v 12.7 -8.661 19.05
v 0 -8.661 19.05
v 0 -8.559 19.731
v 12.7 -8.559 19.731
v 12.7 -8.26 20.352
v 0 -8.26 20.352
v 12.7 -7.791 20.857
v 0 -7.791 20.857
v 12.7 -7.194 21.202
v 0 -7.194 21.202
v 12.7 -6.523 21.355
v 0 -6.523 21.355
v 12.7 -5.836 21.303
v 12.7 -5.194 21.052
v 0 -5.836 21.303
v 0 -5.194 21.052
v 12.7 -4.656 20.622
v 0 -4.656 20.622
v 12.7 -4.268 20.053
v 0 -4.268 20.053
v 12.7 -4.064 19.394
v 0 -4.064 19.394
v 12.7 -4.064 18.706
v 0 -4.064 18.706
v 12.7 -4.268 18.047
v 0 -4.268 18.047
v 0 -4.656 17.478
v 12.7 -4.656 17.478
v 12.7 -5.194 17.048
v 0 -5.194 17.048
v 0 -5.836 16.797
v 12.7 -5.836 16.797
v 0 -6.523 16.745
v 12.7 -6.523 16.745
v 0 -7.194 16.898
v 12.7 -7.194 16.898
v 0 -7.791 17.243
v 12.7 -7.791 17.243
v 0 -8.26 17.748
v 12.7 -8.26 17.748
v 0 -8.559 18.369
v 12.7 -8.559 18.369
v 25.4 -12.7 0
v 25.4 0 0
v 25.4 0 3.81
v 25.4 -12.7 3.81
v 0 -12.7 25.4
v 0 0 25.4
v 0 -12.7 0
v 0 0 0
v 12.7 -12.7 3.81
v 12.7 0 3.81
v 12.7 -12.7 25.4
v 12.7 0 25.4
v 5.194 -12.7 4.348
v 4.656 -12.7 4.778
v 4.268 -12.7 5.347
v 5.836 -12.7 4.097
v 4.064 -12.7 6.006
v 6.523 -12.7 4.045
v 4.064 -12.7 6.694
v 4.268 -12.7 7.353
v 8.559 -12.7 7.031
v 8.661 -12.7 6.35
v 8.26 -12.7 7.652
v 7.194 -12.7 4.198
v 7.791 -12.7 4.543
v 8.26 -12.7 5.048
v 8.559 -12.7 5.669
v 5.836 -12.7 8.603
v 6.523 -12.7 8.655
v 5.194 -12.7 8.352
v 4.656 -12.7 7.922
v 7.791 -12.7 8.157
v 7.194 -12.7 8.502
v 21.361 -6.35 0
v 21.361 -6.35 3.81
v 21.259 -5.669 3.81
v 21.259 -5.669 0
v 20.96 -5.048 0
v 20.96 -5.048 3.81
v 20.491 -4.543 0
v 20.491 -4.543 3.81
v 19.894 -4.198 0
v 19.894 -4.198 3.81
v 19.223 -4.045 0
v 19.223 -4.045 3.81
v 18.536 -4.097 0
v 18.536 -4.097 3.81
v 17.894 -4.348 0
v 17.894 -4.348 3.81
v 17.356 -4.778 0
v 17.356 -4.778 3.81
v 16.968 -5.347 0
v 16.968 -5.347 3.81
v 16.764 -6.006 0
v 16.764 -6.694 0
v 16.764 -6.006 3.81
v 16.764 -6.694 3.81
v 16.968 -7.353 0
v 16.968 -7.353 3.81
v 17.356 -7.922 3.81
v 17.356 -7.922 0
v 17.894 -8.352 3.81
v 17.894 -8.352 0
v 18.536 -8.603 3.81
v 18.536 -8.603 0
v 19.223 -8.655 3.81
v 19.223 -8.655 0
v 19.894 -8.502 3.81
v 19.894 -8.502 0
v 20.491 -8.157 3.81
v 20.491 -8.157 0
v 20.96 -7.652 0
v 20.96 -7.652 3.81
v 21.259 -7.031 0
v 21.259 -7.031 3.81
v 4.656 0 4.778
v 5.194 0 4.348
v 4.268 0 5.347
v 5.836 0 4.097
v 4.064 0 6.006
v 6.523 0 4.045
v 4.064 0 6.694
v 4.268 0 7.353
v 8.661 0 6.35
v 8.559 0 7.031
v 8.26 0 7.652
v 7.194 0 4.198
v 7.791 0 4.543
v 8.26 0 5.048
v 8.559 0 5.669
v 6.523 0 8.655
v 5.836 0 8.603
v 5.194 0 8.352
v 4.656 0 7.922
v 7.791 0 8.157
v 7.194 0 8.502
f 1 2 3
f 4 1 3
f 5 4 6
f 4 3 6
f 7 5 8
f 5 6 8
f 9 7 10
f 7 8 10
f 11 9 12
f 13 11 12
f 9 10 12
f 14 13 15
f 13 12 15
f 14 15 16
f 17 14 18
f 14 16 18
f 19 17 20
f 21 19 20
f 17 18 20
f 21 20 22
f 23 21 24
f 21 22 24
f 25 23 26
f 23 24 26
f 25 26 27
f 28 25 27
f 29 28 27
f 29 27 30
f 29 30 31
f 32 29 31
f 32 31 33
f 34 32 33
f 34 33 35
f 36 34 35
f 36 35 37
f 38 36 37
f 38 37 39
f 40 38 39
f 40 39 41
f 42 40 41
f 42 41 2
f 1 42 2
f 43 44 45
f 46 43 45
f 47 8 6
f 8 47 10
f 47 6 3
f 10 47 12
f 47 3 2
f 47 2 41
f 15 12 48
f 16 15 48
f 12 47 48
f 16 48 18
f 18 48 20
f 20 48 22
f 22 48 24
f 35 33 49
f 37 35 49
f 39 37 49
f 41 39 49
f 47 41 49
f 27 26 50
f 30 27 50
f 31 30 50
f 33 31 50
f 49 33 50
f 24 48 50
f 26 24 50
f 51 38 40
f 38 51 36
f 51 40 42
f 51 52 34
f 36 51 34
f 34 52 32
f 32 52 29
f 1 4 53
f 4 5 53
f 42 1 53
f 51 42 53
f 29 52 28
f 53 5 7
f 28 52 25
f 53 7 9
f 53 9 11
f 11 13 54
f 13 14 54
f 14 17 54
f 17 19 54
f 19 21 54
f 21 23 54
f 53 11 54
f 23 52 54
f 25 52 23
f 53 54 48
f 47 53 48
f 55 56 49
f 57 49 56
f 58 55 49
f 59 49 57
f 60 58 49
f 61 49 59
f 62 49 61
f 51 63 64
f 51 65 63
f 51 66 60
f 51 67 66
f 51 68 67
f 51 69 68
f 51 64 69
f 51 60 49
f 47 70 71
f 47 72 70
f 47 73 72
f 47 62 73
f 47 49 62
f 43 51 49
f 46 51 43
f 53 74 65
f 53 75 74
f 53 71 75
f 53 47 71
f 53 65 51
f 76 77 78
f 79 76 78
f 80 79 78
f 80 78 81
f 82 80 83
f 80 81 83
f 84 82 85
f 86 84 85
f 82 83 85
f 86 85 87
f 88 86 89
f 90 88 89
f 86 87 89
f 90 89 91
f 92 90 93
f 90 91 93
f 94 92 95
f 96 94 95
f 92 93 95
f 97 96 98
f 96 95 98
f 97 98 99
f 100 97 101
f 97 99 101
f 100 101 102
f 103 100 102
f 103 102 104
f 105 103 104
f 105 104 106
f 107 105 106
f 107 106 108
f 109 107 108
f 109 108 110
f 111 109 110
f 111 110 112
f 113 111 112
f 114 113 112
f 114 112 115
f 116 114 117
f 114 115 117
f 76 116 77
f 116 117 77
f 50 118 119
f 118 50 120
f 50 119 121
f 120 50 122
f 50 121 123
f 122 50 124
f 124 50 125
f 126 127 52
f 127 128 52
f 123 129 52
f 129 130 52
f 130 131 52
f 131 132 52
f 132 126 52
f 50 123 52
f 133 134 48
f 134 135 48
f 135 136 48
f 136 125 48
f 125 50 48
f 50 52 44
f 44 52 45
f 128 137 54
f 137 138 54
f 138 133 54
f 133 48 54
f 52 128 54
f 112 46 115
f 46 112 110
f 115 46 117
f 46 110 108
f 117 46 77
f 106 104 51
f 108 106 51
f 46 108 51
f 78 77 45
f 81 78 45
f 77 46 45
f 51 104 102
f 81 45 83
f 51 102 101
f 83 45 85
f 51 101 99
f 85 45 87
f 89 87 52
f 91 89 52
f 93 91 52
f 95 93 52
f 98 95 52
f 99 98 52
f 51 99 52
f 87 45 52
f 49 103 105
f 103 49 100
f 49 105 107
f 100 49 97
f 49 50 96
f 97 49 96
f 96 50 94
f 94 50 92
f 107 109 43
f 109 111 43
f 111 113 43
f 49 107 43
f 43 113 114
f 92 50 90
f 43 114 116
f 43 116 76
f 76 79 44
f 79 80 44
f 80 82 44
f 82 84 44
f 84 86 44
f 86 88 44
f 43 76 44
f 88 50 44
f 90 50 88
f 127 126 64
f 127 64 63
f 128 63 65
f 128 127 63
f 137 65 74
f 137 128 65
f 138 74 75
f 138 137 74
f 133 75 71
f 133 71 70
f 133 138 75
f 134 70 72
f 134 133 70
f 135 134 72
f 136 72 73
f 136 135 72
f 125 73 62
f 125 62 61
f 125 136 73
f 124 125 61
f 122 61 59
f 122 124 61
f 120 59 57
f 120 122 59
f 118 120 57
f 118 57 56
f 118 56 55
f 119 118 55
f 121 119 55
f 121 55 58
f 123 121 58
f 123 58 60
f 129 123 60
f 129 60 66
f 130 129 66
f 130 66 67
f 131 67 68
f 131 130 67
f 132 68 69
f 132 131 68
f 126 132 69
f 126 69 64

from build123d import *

# Parameters (mm, degrees)
F0_R     = 2.3114
F1_DEPTH = 12.7
F2_R     = 2.3114
F3_DEPTH = 25.4
F4_R     = 2.3114
F5_DEPTH = 3.81


with BuildPart() as f1:
    # F0 (on Front) → F1 (new body)
    with BuildSketch(Plane.XZ):
        Polygon((0, 25.4), (0, 0), (25.4, 0), (25.4, 3.81), (12.7, 3.81), (12.7, 25.4), align=None)
        with Locations((6.35, 6.35)):
            Circle(F0_R, mode=Mode.SUBTRACT)
    extrude(amount=F1_DEPTH)

    # F2 (on face) → F3 (cut)
    with BuildSketch(Plane(origin=(0, 0, 0), x_dir=(0, -1, 0), z_dir=(-1, 0, 0))):
        with Locations((6.35, 19.05)):
            Circle(F2_R)
    extrude(amount=-F3_DEPTH, mode=Mode.SUBTRACT)

    # F4 (on face) → F5 (cut)
    with BuildSketch(Plane.XY.offset(3.81)):
        with Locations((19.05, -6.35)):
            Circle(F4_R)
    extrude(amount=-F5_DEPTH, mode=Mode.SUBTRACT)


solid = f1.part
